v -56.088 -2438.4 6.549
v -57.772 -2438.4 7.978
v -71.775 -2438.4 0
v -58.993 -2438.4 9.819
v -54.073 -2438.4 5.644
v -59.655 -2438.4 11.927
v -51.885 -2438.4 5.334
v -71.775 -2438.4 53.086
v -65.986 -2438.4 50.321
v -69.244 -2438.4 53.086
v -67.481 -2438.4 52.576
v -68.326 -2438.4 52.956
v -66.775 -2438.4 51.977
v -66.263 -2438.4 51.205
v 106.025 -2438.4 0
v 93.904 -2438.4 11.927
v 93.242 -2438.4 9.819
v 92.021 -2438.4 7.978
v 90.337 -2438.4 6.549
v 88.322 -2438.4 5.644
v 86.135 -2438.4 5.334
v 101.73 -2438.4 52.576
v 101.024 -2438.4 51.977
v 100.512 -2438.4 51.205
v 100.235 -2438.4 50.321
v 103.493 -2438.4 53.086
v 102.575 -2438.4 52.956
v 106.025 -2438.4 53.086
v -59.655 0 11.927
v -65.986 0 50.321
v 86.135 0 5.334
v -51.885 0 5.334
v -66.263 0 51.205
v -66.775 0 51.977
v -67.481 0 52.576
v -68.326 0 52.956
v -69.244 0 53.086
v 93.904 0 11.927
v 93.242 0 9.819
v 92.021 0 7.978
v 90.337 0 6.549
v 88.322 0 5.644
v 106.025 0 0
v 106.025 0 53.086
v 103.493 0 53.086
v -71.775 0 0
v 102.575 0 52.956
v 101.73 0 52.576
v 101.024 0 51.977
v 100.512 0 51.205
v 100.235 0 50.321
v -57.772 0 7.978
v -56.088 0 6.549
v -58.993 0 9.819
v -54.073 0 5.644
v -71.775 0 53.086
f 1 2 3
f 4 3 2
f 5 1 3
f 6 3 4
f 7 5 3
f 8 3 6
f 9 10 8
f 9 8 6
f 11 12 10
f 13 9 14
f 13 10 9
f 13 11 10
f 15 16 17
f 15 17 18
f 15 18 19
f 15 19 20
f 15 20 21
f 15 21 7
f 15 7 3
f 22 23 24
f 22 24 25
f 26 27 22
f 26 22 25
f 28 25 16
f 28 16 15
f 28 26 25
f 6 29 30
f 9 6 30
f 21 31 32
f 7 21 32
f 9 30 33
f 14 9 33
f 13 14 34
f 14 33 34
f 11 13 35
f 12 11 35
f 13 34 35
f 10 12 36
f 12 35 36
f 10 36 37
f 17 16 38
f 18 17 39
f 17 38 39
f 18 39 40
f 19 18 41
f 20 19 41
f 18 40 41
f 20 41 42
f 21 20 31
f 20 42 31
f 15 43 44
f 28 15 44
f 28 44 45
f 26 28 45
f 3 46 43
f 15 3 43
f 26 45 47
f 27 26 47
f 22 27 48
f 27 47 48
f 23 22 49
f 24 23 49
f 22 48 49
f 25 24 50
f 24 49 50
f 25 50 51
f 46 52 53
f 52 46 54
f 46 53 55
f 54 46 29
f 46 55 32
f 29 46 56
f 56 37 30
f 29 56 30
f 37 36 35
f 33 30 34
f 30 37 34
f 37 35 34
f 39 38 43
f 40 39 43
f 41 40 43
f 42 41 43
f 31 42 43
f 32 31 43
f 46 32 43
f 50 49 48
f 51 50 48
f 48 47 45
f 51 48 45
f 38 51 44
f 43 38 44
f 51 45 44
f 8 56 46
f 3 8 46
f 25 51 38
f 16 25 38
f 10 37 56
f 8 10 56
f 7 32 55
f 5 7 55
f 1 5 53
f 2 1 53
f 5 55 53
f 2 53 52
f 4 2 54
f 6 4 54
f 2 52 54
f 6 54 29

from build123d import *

# Parameters (mm, degrees)
F1_DEPTH = 2438.4


with BuildPart() as f1:
    # F0 (on Front) → F1 (new body)
    with BuildSketch(Plane.XZ):
        with BuildLine():
            Line((-71.775456, 0), (106.024544, 0))
            Line((106.024544, 0), (106.024544, 53.086))
            Line((106.024544, 53.086), (103.492655, 53.086))
            ThreePointArc((103.492655, 53.086), (101.356152, 52.30165), (100.234651, 50.321224))
            Line((100.234651, 50.321224), (93.903676, 11.926927))
            ThreePointArc((93.903676, 11.926927), (91.229326, 7.204374), (86.134588, 5.334))
            Line((86.134588, 5.334), (-51.885499, 5.334))
            ThreePointArc((-51.885499, 5.334), (-56.980237, 7.204374), (-59.654587, 11.926927))
            Line((-59.654587, 11.926927), (-65.985562, 50.321224))
            ThreePointArc((-65.985562, 50.321224), (-67.107063, 52.30165), (-69.243566, 53.086))
            Line((-69.243566, 53.086), (-71.775456, 53.086))
            Line((-71.775456, 53.086), (-71.775456, 0))
        make_face()
    extrude(amount=F1_DEPTH)


solid = f1.part
